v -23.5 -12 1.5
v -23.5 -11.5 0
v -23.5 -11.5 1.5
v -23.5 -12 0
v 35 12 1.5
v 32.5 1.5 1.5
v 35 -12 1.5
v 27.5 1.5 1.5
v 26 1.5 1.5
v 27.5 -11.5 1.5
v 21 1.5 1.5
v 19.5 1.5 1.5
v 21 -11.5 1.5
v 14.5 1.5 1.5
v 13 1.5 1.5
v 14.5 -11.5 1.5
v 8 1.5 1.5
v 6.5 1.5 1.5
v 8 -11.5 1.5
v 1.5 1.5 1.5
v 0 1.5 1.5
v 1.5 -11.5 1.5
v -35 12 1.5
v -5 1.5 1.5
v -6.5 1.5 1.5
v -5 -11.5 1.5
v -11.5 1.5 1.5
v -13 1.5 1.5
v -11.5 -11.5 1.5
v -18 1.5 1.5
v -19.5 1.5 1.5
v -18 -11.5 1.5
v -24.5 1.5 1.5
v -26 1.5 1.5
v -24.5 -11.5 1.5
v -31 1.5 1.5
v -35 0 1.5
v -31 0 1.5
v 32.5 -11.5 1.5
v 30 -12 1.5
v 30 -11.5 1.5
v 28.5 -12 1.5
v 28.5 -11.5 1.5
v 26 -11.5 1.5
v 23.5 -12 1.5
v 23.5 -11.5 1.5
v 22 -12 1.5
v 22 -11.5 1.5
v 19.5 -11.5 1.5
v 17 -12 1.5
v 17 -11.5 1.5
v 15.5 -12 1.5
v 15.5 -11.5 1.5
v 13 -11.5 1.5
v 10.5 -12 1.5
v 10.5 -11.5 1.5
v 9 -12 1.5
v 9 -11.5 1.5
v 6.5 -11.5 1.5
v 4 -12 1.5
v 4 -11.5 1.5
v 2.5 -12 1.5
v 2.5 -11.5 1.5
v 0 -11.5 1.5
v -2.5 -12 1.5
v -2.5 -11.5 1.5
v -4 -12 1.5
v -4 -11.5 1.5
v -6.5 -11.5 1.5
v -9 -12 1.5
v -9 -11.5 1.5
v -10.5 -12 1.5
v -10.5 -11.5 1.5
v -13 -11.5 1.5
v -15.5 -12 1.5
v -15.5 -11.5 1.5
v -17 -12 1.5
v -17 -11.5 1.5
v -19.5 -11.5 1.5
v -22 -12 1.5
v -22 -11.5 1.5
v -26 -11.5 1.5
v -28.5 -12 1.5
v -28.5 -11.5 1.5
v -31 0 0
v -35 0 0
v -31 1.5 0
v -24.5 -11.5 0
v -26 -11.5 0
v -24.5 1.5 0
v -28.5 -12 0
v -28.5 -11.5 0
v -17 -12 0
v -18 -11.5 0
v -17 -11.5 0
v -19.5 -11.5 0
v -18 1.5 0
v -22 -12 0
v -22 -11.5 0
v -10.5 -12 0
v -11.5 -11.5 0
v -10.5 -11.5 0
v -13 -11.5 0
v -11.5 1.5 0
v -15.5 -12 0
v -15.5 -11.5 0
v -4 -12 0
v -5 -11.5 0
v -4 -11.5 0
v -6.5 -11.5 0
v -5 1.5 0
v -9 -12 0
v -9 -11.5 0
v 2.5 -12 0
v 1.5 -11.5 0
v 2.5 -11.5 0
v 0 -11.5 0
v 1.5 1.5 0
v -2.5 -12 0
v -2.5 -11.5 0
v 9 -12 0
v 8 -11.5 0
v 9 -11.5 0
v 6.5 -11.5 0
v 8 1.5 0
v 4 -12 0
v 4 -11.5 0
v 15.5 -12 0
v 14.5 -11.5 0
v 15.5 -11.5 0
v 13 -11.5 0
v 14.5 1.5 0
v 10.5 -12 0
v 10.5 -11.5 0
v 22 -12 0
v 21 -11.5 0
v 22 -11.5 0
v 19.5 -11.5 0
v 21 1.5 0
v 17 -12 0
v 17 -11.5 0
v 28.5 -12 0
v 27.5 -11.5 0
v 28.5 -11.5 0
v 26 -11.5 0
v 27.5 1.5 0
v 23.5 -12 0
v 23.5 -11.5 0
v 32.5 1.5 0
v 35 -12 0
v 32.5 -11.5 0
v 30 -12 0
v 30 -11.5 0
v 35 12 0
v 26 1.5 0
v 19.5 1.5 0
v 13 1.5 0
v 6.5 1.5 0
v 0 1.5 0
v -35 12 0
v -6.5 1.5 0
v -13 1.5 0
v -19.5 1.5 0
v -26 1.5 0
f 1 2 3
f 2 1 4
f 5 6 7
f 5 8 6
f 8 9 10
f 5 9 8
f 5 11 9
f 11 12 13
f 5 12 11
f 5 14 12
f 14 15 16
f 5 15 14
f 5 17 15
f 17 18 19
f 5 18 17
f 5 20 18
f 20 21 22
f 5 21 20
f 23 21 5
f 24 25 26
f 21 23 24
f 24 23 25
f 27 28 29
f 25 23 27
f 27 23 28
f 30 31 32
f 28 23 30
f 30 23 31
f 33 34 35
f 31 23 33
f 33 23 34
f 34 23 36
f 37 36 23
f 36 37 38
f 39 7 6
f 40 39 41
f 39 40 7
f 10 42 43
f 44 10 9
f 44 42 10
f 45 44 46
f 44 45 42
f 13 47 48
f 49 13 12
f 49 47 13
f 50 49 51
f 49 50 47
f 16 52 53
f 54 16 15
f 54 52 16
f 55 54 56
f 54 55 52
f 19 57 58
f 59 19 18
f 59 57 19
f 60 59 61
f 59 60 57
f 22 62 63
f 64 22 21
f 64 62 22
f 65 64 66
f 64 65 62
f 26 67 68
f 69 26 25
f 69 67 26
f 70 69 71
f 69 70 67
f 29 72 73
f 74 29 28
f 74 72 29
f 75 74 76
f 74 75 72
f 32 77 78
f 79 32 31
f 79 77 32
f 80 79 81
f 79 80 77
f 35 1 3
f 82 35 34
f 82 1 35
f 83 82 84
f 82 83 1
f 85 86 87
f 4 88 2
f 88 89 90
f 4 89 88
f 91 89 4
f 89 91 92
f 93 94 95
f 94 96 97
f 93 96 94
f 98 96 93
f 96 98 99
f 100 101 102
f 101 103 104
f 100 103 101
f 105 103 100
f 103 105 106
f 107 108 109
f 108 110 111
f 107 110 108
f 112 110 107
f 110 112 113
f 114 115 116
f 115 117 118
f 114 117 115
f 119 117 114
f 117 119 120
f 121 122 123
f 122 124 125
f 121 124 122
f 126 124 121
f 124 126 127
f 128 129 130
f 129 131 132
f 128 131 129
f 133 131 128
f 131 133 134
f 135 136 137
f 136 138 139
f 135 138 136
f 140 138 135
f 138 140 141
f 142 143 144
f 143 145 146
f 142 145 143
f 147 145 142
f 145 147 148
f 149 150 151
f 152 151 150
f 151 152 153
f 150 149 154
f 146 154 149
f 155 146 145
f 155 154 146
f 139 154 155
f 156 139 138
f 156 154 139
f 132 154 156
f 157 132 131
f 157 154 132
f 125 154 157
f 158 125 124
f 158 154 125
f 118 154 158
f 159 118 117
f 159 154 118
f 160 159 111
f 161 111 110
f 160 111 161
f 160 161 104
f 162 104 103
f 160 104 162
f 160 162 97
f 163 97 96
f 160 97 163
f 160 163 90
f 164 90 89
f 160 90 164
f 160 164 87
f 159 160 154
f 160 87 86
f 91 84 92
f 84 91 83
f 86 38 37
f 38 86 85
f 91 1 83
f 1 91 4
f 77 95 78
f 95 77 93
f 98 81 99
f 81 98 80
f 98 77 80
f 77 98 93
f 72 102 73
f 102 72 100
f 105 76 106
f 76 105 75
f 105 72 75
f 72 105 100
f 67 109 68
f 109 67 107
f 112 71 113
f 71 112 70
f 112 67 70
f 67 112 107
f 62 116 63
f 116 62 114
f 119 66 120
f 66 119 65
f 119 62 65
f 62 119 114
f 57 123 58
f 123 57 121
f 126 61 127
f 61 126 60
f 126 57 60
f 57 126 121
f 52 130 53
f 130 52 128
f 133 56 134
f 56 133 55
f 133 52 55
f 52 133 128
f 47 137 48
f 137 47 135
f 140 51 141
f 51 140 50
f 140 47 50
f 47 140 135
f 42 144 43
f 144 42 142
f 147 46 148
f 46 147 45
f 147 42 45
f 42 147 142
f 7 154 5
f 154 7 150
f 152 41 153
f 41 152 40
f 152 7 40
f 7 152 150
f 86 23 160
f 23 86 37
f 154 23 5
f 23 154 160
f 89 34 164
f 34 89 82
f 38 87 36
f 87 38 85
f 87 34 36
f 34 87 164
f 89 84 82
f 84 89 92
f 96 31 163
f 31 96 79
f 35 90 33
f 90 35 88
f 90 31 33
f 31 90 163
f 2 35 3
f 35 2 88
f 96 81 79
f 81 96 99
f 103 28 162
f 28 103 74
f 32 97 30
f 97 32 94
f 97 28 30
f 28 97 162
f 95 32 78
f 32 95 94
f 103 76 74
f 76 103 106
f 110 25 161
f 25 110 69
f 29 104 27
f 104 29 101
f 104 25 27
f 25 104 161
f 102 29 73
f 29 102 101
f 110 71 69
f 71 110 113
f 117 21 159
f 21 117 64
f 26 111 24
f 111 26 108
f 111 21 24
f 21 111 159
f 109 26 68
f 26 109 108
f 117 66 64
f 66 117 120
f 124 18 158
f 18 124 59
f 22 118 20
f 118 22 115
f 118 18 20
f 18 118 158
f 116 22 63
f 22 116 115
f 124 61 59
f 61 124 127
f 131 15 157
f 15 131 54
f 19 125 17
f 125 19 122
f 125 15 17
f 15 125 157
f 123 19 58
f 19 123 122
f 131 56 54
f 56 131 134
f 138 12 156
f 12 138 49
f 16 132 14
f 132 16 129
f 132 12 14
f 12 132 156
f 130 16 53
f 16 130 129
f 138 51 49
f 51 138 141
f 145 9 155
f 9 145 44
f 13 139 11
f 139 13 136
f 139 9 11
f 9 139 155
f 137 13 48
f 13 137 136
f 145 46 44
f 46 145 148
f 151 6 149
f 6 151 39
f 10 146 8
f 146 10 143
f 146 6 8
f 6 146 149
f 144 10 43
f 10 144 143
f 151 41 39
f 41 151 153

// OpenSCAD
// 10-well agarose gel comb, printed flat
// Units: mm

// ---- Spine ----
spine_len   = 70;   // spine length along X
spine_wid   = 12;   // spine width along Y
spine_thk   = 1.5;  // spine thickness along Z

// ---- Teeth ----
tooth_count = 10;   // number of teeth
tooth_w     = 5.0;  // tooth width along X
tooth_l     = 12;   // tooth length along Y (hangs from -Y edge)
tooth_gap   = 1.5;  // gap between neighbouring teeth along X

// ---- Misc ----
eps = 0.5;          // cutter overshoot past faces

$fn = 64;

// Offset so the tooth row is centred on the spine in X
row_start = -(tooth_count - 1) * tooth_w / 2 - (tooth_count - 2) * tooth_gap / 2;

difference() {
    union() {
        // Spine (back bar)
        translate([-spine_len / 2, 0, 0])
            cube([spine_len, spine_wid, spine_thk]);

        // Teeth hanging from the -Y edge
        for (i = [0 : tooth_count - 1])
            translate([row_start + i * (tooth_w + tooth_gap), -tooth_l, 0])
                cube([tooth_w, tooth_l, spine_thk]);
    }

    // Cut out the wells (through the full thickness)
    for (i = [0 : tooth_count - 1])
        translate([row_start + i * (tooth_w + tooth_gap) - tooth_w / 2,
                   -tooth_l + eps,
                   -eps])
            cube([tooth_w, tooth_l + 2 * eps, spine_thk + 2 * eps]);
}
